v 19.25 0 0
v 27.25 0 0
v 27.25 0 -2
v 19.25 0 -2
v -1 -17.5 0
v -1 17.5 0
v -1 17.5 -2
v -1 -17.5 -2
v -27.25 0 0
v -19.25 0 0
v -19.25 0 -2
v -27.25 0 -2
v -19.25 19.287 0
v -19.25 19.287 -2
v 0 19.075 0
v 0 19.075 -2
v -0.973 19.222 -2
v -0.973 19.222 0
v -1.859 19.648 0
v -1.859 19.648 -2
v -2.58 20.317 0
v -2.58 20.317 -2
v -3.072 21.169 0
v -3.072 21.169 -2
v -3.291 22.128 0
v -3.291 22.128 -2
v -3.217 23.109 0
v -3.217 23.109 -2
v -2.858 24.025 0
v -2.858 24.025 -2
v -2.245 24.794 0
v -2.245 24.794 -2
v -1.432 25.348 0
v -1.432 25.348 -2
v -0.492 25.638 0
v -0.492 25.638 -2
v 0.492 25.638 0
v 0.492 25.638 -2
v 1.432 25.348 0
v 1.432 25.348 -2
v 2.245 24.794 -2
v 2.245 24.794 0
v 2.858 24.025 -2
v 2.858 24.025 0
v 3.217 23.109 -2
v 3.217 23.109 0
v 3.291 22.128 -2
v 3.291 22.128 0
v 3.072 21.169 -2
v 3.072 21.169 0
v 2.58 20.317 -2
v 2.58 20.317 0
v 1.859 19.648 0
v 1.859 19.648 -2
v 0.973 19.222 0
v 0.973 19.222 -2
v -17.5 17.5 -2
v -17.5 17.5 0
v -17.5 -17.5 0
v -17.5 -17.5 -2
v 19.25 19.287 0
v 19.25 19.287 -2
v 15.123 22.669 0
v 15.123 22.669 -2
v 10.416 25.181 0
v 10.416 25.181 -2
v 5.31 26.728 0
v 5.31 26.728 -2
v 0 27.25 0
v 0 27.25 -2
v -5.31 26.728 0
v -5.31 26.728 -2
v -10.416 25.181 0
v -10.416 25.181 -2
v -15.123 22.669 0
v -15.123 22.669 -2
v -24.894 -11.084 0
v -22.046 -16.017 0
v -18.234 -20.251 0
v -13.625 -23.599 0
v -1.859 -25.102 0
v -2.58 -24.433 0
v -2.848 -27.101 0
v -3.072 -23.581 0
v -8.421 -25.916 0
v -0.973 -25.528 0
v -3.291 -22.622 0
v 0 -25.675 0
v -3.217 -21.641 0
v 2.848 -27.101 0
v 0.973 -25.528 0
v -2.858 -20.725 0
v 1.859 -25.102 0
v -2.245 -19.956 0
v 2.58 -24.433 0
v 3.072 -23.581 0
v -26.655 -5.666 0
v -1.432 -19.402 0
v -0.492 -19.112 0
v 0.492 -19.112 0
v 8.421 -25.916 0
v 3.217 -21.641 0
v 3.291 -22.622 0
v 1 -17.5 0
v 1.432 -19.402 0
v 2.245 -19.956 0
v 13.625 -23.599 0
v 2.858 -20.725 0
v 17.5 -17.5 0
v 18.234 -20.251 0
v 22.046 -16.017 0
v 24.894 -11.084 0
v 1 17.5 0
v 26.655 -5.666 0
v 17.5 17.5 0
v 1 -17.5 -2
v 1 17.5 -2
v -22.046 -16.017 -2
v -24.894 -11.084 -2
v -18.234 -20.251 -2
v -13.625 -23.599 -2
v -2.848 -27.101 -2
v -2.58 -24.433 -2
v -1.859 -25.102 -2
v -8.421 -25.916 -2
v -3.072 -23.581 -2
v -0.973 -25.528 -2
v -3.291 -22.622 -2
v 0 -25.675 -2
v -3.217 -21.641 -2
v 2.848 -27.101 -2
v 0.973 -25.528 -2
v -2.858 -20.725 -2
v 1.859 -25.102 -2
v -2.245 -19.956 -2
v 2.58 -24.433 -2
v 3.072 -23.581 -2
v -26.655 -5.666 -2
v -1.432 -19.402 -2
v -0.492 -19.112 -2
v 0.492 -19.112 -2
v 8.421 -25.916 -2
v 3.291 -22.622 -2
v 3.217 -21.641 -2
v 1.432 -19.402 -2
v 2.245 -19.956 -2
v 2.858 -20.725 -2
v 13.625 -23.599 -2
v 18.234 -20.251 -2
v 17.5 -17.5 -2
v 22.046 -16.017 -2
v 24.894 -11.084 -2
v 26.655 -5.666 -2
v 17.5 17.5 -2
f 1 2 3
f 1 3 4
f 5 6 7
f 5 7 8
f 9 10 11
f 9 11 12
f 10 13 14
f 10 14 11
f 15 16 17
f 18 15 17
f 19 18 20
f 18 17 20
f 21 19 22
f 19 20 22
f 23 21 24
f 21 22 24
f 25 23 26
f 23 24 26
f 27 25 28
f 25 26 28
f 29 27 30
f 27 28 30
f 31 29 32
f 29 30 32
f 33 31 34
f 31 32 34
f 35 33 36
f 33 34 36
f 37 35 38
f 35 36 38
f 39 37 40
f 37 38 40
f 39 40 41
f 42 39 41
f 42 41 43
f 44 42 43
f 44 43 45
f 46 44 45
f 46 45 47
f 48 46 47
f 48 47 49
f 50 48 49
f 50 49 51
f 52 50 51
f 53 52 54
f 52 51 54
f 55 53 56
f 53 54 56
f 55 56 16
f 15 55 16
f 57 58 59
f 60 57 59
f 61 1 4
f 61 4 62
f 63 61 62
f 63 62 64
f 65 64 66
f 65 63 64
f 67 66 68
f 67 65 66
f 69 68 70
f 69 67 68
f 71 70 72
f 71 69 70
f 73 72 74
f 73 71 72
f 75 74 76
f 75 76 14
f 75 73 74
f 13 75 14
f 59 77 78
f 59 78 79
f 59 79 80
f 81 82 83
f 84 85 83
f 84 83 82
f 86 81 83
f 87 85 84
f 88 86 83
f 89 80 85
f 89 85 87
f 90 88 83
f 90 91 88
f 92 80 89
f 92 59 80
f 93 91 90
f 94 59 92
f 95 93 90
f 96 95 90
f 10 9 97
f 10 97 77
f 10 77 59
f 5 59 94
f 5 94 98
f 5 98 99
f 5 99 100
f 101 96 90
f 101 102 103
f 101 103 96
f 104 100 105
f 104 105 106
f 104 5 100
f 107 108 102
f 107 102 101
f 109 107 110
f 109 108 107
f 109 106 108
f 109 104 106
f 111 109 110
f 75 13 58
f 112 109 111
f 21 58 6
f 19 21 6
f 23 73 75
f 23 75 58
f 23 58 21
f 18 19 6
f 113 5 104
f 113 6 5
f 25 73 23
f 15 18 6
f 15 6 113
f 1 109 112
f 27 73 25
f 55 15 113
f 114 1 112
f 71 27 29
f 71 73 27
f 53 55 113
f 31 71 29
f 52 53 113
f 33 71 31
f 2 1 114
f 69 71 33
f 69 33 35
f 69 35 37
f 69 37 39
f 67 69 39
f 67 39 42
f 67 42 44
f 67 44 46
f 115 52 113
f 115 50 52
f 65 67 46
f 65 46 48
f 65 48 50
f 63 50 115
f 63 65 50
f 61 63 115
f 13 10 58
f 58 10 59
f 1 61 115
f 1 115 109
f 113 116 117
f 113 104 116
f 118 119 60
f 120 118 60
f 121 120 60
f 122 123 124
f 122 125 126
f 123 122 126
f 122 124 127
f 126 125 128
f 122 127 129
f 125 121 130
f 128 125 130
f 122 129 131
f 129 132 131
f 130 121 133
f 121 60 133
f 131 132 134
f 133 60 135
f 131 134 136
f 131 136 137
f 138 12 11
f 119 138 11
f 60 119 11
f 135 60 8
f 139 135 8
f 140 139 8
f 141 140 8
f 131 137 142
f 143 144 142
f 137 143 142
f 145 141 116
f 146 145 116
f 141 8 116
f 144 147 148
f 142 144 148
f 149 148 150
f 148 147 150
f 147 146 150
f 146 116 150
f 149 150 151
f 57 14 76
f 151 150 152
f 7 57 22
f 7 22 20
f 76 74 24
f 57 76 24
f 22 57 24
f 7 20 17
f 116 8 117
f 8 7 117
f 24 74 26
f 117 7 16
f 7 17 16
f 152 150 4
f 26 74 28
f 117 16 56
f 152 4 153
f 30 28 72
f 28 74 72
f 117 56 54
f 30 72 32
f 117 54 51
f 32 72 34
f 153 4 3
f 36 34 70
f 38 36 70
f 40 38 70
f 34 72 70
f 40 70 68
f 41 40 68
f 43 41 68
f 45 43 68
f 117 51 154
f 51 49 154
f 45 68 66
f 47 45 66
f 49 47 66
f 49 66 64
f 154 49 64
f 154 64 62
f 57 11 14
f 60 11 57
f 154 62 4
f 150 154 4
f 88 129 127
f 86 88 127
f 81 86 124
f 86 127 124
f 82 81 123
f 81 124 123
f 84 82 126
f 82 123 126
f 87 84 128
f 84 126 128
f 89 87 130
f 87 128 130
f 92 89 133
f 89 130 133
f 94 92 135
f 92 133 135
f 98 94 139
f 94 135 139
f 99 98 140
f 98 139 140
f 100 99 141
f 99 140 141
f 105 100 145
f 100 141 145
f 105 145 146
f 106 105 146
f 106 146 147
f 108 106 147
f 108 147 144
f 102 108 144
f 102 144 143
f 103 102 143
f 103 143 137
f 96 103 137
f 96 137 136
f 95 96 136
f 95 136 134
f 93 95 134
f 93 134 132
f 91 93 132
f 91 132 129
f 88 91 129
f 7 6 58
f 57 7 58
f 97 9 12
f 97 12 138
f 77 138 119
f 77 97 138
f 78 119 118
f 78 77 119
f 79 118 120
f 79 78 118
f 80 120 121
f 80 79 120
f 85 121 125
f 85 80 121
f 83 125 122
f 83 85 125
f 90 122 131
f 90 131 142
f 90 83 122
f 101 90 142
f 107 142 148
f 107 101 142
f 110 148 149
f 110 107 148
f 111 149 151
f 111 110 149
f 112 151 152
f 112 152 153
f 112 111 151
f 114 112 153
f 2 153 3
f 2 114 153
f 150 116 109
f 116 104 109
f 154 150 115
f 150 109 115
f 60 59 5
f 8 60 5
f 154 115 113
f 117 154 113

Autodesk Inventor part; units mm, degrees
ref_plane "YZ Plane" through (0, 0, 0) normal (1, 0, 0) x (0, 1, 0)
ref_plane "XZ Plane" through (0, 0, 0) normal (0, 1, 0) x (-1, 0, 0)
ref_plane "XY Plane" through (0, 0, 0) normal (0, 0, 1) x (1, 0, 0)
sketch "スケッチ1" plane through (0, 0, 0) normal (0, 0, 1) x (1, 0, 0)
  circle A0 centre (0, 0) radius 27.25
  line L0 (17.5, 17.5) -> (-17.5, 17.5)
  line L1 (-17.5, 17.5) -> (-17.5, -17.5)
  line L2 (-17.5, -17.5) -> (17.5, -17.5)
  line L3 (17.5, -17.5) -> (17.5, 17.5)
  line L4 (17.5, 17.5) -> (-17.5, -17.5) construction
  line L5 (-17.5, 17.5) -> (17.5, -17.5) construction
  line L6 (1, 17.5) -> (-1, 17.5)
  line L7 (-1, 17.5) -> (-1, -17.5)
  line L8 (-1, -17.5) -> (1, -17.5)
  line L9 (1, -17.5) -> (1, 17.5)
  line L10 (1, 17.5) -> (-1, -17.5) construction
  line L11 (-1, 17.5) -> (1, -17.5) construction
  point P0 (1, -17.5)
  point P1 (1, 17.5)
  point P2 (-1, 17.5)
  point P3 (-1, -17.5)
  dimension "d0" = 54.5
  dimension "d6" = 35
  dimension "d107" = 2
  dimension "d108" = 35
extrude "押し出し1" add sketch "スケッチ1" against normal blind 2 contours A0 | L9 L2 L7 L0
sketch "スケッチ2" plane through (0, 0, 0) normal (0, 0, 1) x (1, 0, 0)
  line L0 (0, 42.4511) -> (0, -37.5489)
  line L1 (38.0038, 0) -> (-41.9962, 0)
  line L2 (27.25, 42.0143) -> (27.25, -37.9857)
  circle A0 centre (0, 0) radius 27.25 projected
  line L3 (17.5, 17.5) -> (17.5, -17.5) projected
  line L4 (19.25, 25) -> (27.25, 25)
  line L5 (27.25, 25) -> (27.25, -25)
  line L6 (27.25, -25) -> (19.25, -25)
  line L7 (19.25, -25) -> (19.25, 25)
  line L8 (19.25, 25) -> (27.25, -25) construction
  line L9 (27.25, 25) -> (19.25, -25) construction
  point P0 (17.5, 0)
  point P1 (23.25, 0)
  point P2 (19.25, 0)
  point P3 (27.25, 0)
  dimension "d13" = 9.75
  dimension "d14" = 8
  dimension "d15" = 50
  dimension "d19" = 54.5
  dimension "d110" = 1.75
extrude "押し出し2" cut sketch "スケッチ2" against normal blind 10 contours L7 L4 L2 A0 | A0 L1 L7 picked at (20.3822, 11.481)
mirror "ミラー1" about plane through (0, 0, 0) normal (1, 0, 0) of "押し出し2"
sketch "スケッチ8" plane through (0, 0, 0) normal (0, 0, 1) x (1, 0, 0)
  circle A0 centre (0, 0) radius 22.375
  circle A1 centre (0, 0) radius 27.25
  line L0 (0, 31.1603) -> (0, -30.8706)
  point P0 (0, 0)
  point P1 (0, 22.375)
  point P2 (0, -22.375)
  dimension "d112" = 44.75
  dimension "d113" = 54.5
hole "穴5" at (0, 22.375, 0) at (0, -22.375, 0) direction (0, 0, -1) diameter 6.6 end through all clearance for "Countersunk Flat Head Screw ISO 2009/7046" size "M6" standard "ISO"
properties part number "Part3_A_Y" material "鋼、軟鋼"
